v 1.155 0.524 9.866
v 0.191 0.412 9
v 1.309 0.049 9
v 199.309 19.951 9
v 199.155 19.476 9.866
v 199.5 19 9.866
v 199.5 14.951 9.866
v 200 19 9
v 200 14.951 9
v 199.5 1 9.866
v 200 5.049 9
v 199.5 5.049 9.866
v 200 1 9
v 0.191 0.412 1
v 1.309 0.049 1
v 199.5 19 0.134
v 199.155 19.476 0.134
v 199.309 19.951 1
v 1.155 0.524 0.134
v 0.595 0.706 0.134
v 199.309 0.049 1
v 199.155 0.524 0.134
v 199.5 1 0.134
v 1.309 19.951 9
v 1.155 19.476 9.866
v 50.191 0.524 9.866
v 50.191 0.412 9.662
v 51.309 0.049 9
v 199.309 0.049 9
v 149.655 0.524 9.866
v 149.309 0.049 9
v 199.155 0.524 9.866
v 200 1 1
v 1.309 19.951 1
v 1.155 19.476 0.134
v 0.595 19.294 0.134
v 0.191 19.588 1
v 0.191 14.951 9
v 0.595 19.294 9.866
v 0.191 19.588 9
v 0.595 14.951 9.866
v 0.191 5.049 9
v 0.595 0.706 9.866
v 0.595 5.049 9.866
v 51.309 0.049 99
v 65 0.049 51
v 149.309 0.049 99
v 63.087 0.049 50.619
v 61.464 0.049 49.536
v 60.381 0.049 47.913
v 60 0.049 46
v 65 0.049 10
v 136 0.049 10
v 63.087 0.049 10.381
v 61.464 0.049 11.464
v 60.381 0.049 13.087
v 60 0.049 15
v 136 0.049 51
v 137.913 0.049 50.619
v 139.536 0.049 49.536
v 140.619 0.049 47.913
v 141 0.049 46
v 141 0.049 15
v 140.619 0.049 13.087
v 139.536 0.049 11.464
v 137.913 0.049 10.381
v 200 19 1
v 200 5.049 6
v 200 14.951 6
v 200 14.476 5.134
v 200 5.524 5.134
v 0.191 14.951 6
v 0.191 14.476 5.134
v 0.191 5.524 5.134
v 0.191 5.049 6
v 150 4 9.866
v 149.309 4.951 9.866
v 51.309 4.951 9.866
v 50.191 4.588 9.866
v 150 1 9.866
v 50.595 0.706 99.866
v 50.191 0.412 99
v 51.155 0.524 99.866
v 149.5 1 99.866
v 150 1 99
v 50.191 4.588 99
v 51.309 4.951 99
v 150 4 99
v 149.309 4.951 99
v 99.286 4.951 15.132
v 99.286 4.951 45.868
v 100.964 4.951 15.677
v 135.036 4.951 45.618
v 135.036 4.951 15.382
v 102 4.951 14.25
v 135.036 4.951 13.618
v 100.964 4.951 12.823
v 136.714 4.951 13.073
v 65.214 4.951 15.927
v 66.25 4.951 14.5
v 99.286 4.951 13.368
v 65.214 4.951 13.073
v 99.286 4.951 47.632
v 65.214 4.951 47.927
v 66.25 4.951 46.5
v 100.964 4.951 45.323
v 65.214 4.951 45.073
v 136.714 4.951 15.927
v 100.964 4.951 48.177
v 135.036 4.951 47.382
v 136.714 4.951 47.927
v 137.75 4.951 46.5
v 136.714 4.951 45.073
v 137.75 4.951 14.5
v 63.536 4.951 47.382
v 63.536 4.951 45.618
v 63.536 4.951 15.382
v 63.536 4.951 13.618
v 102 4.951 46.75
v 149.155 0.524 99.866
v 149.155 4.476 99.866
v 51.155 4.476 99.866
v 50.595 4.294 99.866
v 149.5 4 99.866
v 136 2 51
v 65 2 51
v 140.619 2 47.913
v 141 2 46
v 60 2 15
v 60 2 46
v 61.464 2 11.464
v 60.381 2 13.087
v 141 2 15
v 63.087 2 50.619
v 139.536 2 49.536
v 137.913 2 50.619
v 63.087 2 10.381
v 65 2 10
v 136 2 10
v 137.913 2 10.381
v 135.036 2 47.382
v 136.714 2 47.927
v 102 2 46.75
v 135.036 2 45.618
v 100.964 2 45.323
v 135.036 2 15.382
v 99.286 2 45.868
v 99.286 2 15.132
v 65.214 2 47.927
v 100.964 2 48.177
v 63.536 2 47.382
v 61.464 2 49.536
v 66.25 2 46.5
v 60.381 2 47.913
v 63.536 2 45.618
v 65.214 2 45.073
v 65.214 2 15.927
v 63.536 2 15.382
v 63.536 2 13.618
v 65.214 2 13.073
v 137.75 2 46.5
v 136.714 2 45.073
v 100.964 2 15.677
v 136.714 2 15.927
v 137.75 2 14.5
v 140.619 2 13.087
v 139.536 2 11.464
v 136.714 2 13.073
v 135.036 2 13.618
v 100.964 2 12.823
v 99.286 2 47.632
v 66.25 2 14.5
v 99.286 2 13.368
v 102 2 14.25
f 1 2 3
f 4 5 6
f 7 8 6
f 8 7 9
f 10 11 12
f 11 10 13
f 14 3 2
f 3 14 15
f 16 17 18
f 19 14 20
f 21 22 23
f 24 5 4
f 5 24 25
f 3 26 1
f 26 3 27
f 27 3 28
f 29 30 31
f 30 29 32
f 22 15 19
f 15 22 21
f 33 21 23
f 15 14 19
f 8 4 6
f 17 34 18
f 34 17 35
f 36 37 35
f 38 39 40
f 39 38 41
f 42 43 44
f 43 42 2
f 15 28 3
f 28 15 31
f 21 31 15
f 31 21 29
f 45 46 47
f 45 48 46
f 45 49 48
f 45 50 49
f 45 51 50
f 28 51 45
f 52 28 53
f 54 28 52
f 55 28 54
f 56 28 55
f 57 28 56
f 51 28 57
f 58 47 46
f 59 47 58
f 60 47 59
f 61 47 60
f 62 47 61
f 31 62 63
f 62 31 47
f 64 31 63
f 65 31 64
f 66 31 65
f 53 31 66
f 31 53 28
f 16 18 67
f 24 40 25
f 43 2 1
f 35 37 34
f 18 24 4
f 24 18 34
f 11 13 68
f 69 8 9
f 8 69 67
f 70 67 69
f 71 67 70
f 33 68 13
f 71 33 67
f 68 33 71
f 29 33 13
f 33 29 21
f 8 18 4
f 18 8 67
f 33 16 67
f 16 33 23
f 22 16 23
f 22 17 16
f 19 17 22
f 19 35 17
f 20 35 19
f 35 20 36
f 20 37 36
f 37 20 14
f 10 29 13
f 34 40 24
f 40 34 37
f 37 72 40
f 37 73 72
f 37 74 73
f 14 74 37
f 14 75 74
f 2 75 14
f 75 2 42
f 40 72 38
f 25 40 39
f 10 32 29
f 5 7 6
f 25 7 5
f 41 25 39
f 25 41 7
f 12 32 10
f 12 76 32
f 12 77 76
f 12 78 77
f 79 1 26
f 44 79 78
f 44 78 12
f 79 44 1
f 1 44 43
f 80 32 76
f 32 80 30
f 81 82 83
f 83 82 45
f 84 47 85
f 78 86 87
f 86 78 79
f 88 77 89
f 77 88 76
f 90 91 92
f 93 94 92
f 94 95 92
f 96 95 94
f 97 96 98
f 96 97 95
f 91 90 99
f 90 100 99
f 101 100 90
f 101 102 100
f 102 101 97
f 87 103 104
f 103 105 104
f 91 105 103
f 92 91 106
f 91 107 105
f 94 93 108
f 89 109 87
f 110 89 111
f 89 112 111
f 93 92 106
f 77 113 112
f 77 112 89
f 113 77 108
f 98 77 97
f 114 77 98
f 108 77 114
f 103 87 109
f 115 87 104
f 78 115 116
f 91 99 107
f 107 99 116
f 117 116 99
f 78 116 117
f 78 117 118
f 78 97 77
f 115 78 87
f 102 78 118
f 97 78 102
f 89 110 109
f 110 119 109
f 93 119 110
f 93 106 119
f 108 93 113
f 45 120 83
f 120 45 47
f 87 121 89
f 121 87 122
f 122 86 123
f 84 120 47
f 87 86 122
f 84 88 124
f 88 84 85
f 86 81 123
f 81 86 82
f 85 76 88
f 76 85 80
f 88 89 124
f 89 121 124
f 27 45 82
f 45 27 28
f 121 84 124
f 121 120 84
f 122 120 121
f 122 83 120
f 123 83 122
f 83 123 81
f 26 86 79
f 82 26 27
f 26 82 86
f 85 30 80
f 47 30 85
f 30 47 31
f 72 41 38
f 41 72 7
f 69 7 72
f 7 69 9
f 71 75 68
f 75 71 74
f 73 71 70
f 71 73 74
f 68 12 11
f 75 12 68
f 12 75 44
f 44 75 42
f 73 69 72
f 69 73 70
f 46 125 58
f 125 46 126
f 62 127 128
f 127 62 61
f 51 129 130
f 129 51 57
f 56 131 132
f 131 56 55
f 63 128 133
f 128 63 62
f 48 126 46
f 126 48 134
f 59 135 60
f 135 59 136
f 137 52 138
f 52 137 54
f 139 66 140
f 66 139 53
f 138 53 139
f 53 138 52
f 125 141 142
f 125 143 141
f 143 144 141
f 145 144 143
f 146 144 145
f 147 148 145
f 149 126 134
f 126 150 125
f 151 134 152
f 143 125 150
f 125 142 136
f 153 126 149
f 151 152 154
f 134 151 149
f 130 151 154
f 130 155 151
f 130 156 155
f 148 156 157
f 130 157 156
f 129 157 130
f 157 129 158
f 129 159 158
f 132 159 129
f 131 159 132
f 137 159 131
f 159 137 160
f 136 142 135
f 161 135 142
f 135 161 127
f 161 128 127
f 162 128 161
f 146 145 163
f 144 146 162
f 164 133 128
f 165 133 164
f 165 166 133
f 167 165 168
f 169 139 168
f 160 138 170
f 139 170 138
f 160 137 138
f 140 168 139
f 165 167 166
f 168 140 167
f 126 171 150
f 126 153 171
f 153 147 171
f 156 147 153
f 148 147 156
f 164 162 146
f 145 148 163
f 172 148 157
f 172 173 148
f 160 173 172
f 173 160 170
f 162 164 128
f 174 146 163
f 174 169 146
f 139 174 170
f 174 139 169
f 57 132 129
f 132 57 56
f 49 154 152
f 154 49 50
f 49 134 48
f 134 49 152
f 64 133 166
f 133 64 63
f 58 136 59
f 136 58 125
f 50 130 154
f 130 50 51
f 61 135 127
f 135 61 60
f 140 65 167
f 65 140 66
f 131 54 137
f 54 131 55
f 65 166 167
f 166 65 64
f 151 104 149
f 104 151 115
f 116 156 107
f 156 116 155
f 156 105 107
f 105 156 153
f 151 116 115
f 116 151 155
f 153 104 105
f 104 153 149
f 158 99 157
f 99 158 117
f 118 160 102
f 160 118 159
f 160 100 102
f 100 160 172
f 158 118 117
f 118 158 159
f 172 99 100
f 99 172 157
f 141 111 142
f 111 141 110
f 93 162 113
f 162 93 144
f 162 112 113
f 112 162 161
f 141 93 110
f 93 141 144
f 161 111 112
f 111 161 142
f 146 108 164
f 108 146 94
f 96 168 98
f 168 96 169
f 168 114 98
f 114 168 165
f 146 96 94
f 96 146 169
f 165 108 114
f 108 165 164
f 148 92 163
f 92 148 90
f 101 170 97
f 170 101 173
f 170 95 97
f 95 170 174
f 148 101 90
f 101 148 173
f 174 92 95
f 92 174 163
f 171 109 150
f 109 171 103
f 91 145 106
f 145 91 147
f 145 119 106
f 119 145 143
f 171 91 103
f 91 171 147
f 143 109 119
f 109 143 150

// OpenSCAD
//$fn=50;

BACKPLATE_DEPTH=41;
BACKPLATE_WIDTH=81;
BACKPLATE_HEIGHT=2.5;
BACKPLATE_RADIUS=5;
BACKPLATE_SCREW_DIAMETER=3;
MOUNT_SCREW_DIAMETER=6;

radius=1;

module roundedcube(size = [1, 1, 1], shift = [0, 0], center = false, radius = 0.5, apply_to = "all") {
	// Higher definition curves
    //$fs = .15;        
	// Use shift parameter to change the size of the bottom left/bottom front side with respect to the top
	// If single value, convert to [x, y, z] vector
	size = (size[0] == undef) ? [size, size, size] : size;
	shift = (shift[0] == undef) ? [shift, shift, shift] : shift;

	translate_min = radius;
	translate_xmax = size[0] - radius;
	translate_ymax = size[1] - radius;
	translate_zmax = size[2] - radius;

	diameter = radius * 2;

	module build_point(type = "sphere", rotate = [0, 0, 0]) {
		if (type == "sphere") {
			sphere(r = radius);
		} else if (type == "cylinder") {
			rotate(a = rotate)
			cylinder(h = diameter, r = radius, center = true);
		}
	}

	obj_translate = (center == false) ?
		[0, 0, 0] : [
			-(size[0] / 2),
			-(size[1] / 2),
			-(size[2] / 2)
		];

	translate(v = obj_translate) {
		hull() {
			for (translate_x = [translate_min, translate_xmax]) {
				x_at = (translate_x == translate_min) ? "min" : "max";
				for (translate_y = [translate_min, translate_ymax]) {
					y_at = (translate_y == translate_min) ? "min" : "max";
					for (translate_z = [translate_min, translate_zmax]) {
						z_at = (translate_z == translate_min) ? "min" : "max";
						shift_x = (z_at == "min" && x_at == "min") ? shift[0] : 0;
						shift_y = (z_at == "min" && y_at == "min") ? shift[1] : 0; 
						translate(v = [translate_x + shift_x, translate_y + shift_y, translate_z])
						if (
							(apply_to == "all") ||
							(apply_to == "xmin" && x_at == "min") || (apply_to == "xmax" && x_at == "max") ||
							(apply_to == "ymin" && y_at == "min") || (apply_to == "ymax" && y_at == "max") ||
							(apply_to == "zmin" && z_at == "min") || (apply_to == "zmax" && z_at == "max")
						) {
							build_point("sphere");
						} else {
							rotate = 
								(apply_to == "xmin" || apply_to == "xmax" || apply_to == "x") ? [0, 90, 0] : (
								(apply_to == "ymin" || apply_to == "ymax" || apply_to == "y") ? [90, 90, 0] :
								[0, 0, 0]
							);
							build_point("cylinder", rotate);
						}
					}
				}
			}
		}
	}
}

module m3nut(height, rotate=0) {
    $fn=6;
    rotate([0,0,rotate]) cylinder(d=6.2,h=height);
}

module backplate_base(height) {
minkowski()
    {
      cube([BACKPLATE_WIDTH-2*BACKPLATE_RADIUS,BACKPLATE_DEPTH-2*BACKPLATE_RADIUS,height/2]);
      cylinder(r=5,h=height/2);
    }
}

module inner_backplate_base(height) {
    inner_radius=2.5;
    band_width=7;
    center_shift=-BACKPLATE_RADIUS+inner_radius+band_width;
    translate([center_shift,center_shift,-height/2])
        minkowski()
            {
              cube([BACKPLATE_WIDTH-2*inner_radius-2*band_width,
                BACKPLATE_DEPTH-2*inner_radius-2*band_width,height]);
              cylinder(r=inner_radius,h=height);
            }
        }

module backplate_screwhole(height) {
    translate([0,0,0])
        cylinder(d=BACKPLATE_SCREW_DIAMETER,h=height*4);
}

module backplate_bottom(height) {
union() {
        backplate_base(height);
        tolerance=-.5;
        translate([tolerance/2,tolerance,0])
            backplate_screwhole(height);
        translate([tolerance/2,BACKPLATE_DEPTH-2*BACKPLATE_RADIUS-tolerance,0])
            backplate_screwhole(height);
        translate([BACKPLATE_WIDTH-2*BACKPLATE_RADIUS-tolerance/2,tolerance,0])
            backplate_screwhole(height);
        translate([BACKPLATE_WIDTH-2*BACKPLATE_RADIUS-tolerance/2,BACKPLATE_DEPTH-2*BACKPLATE_RADIUS-tolerance,0])
            backplate_screwhole(height);
        translate([BACKPLATE_WIDTH/2-BACKPLATE_RADIUS,BACKPLATE_DEPTH-2*BACKPLATE_RADIUS-tolerance*1.5,0])
            backplate_screwhole(height);
        translate([BACKPLATE_WIDTH/2-BACKPLATE_RADIUS,tolerance*1.5,0])
            backplate_screwhole(height);
    }
}

module bottom_arm() {
    arm_width=200;
    stand_width=100;
    stand_radius=25;
    out_depth=20;
    in_depth=10;
    height=10;
    difference() {
        union() {
        roundedcube(size=[arm_width,out_depth,height], radius=radius);
        translate([(arm_width-stand_width)/2,0,0])
            roundedcube(size=[stand_width,5,100], radius=radius);
        }
        translate([-2*radius,(out_depth-in_depth)/2, height/2])
            roundedcube(size=[arm_width*(1+2*radius),in_depth,height], radius=radius);

    }
}

difference(){
    bottom_arm();
    rotate([-90,0,0]) translate([BACKPLATE_RADIUS+60,-BACKPLATE_DEPTH+BACKPLATE_RADIUS-10,0]) backplate_bottom(2);
}
